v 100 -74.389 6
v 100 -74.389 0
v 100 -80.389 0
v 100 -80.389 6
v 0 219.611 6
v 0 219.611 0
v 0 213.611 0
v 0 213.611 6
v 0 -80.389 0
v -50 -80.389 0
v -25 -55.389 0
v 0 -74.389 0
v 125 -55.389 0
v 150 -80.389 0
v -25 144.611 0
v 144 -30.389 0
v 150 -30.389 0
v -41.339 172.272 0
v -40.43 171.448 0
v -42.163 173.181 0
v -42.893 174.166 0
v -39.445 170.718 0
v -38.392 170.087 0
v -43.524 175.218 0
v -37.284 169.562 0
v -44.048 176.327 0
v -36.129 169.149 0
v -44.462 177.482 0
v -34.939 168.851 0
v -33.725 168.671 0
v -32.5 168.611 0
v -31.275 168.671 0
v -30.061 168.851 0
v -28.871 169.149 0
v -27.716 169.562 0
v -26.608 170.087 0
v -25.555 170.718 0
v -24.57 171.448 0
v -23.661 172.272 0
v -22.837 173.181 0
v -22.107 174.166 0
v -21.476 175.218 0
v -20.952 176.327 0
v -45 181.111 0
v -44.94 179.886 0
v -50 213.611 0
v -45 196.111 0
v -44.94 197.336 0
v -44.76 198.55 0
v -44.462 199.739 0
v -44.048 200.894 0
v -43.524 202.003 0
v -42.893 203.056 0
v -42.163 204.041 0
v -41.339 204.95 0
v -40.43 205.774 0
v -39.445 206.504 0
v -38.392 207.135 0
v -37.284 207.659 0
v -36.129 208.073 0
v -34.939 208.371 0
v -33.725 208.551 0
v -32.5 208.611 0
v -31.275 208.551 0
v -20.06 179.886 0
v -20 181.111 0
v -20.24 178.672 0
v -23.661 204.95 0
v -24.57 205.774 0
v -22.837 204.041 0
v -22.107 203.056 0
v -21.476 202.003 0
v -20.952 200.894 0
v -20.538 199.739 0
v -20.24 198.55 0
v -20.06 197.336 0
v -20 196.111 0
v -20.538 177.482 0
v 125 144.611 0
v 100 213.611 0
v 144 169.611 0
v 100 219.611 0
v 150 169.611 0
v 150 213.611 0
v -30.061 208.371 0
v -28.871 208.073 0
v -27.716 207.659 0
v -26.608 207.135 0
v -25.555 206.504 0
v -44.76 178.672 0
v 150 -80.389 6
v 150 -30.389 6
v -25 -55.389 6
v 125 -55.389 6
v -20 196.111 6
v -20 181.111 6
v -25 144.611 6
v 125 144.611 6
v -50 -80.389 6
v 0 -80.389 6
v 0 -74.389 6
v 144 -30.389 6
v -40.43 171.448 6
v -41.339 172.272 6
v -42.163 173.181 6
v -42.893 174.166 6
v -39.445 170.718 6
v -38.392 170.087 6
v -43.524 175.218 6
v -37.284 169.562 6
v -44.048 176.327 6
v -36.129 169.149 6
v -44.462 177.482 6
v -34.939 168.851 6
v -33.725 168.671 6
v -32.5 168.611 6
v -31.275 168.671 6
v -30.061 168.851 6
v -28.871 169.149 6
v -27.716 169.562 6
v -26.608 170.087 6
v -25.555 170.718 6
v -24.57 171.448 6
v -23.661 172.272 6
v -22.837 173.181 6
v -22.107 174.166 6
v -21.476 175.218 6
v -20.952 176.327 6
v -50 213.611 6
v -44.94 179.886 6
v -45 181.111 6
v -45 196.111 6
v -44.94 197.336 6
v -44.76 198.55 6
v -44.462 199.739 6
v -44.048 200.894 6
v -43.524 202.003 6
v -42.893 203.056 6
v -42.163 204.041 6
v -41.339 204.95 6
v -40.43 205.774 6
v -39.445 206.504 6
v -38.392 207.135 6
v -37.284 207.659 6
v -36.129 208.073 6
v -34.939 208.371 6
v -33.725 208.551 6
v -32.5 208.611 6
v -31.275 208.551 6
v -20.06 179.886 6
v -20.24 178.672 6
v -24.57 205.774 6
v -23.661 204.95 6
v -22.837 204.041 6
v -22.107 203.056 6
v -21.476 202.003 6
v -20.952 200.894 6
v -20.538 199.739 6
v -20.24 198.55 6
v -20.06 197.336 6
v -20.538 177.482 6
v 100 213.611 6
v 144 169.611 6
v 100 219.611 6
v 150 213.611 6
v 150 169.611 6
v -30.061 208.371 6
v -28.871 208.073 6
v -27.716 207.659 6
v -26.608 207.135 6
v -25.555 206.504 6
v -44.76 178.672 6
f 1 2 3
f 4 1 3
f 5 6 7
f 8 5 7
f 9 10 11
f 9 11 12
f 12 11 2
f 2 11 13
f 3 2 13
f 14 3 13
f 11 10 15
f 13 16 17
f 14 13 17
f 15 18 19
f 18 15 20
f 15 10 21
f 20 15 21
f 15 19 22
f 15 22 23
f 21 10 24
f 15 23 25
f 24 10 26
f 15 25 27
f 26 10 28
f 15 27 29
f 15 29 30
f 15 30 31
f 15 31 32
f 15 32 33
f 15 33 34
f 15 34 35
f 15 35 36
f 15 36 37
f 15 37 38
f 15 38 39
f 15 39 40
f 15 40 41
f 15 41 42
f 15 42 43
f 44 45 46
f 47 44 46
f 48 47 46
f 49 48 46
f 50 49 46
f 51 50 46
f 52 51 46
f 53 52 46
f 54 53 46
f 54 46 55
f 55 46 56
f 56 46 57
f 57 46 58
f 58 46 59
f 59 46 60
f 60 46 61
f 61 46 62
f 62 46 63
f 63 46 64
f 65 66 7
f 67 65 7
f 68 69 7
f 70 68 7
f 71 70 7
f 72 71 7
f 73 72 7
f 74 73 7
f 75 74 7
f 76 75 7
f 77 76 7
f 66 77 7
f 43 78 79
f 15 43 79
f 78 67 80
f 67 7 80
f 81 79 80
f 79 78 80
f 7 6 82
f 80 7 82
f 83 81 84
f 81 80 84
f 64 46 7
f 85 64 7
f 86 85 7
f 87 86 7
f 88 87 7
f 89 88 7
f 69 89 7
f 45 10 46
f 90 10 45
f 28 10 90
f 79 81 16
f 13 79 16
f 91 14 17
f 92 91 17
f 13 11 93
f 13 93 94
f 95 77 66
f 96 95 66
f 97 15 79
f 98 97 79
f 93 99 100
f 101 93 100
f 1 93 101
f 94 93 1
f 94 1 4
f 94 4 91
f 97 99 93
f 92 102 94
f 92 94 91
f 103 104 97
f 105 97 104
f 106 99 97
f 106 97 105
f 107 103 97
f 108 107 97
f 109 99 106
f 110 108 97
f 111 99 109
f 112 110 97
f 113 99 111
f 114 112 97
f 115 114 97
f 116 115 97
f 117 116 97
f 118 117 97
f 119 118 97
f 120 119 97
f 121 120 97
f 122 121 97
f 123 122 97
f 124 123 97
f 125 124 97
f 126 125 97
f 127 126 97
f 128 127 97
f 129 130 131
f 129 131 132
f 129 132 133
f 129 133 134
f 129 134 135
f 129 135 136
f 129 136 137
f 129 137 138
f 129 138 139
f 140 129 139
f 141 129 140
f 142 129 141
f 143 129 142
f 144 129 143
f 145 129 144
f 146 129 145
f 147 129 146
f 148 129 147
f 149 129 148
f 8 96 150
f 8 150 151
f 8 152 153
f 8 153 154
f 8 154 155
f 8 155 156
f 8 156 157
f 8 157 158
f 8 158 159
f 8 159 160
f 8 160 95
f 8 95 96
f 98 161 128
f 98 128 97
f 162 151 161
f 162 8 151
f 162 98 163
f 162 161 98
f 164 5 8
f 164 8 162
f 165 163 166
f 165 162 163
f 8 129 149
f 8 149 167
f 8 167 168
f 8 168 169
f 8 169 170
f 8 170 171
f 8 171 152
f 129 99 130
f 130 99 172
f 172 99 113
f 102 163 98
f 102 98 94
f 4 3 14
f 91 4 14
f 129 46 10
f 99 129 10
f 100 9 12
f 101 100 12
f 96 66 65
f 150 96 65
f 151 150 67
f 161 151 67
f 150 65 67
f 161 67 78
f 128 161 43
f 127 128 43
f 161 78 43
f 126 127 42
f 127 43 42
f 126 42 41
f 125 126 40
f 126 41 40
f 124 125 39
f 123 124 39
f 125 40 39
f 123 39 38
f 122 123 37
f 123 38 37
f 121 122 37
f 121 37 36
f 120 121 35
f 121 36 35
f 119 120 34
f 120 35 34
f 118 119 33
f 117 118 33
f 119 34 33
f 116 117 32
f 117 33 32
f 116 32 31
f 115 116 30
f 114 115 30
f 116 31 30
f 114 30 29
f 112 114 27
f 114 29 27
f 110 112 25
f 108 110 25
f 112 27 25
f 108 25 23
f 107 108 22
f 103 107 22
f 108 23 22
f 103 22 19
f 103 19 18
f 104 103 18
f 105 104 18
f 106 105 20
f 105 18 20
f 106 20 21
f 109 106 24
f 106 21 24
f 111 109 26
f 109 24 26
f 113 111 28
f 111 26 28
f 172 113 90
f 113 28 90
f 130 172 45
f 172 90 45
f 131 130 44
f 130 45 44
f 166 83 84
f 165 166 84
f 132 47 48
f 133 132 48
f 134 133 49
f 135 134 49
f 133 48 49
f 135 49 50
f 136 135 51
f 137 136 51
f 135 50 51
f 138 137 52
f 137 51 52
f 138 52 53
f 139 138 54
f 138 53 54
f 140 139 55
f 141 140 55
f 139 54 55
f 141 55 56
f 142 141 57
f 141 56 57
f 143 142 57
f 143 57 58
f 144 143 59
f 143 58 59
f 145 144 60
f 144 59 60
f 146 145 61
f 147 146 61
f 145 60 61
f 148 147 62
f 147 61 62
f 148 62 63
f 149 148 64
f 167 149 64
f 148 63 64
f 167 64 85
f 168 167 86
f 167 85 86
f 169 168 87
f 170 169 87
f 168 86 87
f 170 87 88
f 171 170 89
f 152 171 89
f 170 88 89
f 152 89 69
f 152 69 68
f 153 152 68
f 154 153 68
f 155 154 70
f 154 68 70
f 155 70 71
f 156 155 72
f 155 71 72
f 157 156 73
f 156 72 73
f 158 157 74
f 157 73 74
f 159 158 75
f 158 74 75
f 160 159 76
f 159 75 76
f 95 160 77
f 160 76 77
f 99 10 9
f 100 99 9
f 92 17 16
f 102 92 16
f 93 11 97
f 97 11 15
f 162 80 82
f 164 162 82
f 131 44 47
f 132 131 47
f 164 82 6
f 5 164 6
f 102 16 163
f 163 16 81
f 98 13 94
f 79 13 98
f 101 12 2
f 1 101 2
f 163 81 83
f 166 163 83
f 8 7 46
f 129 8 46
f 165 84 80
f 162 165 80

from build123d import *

# Parameters (mm, degrees)
F0_W     = 150
F0_H     = 200
F1_DEPTH = 6


with BuildPart() as f1:
    # F0 (on Top) → F1 (new body)
    with BuildSketch(Plane.XY):
        Polygon((0, 213.610874), (-50, 213.610874), (-50, -80.389126), (0, -80.389126), (0, -74.389126), (100, -74.389126), (100, -80.389126), (150, -80.389126), (150, -30.389126), (144, -30.389126), (144, 169.610874), (150, 169.610874), (150, 213.610874), (100, 213.610874), (100, 219.610874), (0, 219.610874), align=None)
        with Locations((50, 44.610874)):
            Rectangle(F0_W, F0_H, mode=Mode.SUBTRACT)
        with BuildLine():
            Line((-45, 181.110874), (-45, 196.110874))
            ThreePointArc((-45, 196.110874), (-32.5, 208.610874), (-20, 196.110874))
            Line((-20, 196.110874), (-20, 181.110874))
            ThreePointArc((-20, 181.110874), (-32.5, 168.610874), (-45, 181.110874))
        make_face(mode=Mode.SUBTRACT)
    extrude(amount=F1_DEPTH)


solid = f1.part
